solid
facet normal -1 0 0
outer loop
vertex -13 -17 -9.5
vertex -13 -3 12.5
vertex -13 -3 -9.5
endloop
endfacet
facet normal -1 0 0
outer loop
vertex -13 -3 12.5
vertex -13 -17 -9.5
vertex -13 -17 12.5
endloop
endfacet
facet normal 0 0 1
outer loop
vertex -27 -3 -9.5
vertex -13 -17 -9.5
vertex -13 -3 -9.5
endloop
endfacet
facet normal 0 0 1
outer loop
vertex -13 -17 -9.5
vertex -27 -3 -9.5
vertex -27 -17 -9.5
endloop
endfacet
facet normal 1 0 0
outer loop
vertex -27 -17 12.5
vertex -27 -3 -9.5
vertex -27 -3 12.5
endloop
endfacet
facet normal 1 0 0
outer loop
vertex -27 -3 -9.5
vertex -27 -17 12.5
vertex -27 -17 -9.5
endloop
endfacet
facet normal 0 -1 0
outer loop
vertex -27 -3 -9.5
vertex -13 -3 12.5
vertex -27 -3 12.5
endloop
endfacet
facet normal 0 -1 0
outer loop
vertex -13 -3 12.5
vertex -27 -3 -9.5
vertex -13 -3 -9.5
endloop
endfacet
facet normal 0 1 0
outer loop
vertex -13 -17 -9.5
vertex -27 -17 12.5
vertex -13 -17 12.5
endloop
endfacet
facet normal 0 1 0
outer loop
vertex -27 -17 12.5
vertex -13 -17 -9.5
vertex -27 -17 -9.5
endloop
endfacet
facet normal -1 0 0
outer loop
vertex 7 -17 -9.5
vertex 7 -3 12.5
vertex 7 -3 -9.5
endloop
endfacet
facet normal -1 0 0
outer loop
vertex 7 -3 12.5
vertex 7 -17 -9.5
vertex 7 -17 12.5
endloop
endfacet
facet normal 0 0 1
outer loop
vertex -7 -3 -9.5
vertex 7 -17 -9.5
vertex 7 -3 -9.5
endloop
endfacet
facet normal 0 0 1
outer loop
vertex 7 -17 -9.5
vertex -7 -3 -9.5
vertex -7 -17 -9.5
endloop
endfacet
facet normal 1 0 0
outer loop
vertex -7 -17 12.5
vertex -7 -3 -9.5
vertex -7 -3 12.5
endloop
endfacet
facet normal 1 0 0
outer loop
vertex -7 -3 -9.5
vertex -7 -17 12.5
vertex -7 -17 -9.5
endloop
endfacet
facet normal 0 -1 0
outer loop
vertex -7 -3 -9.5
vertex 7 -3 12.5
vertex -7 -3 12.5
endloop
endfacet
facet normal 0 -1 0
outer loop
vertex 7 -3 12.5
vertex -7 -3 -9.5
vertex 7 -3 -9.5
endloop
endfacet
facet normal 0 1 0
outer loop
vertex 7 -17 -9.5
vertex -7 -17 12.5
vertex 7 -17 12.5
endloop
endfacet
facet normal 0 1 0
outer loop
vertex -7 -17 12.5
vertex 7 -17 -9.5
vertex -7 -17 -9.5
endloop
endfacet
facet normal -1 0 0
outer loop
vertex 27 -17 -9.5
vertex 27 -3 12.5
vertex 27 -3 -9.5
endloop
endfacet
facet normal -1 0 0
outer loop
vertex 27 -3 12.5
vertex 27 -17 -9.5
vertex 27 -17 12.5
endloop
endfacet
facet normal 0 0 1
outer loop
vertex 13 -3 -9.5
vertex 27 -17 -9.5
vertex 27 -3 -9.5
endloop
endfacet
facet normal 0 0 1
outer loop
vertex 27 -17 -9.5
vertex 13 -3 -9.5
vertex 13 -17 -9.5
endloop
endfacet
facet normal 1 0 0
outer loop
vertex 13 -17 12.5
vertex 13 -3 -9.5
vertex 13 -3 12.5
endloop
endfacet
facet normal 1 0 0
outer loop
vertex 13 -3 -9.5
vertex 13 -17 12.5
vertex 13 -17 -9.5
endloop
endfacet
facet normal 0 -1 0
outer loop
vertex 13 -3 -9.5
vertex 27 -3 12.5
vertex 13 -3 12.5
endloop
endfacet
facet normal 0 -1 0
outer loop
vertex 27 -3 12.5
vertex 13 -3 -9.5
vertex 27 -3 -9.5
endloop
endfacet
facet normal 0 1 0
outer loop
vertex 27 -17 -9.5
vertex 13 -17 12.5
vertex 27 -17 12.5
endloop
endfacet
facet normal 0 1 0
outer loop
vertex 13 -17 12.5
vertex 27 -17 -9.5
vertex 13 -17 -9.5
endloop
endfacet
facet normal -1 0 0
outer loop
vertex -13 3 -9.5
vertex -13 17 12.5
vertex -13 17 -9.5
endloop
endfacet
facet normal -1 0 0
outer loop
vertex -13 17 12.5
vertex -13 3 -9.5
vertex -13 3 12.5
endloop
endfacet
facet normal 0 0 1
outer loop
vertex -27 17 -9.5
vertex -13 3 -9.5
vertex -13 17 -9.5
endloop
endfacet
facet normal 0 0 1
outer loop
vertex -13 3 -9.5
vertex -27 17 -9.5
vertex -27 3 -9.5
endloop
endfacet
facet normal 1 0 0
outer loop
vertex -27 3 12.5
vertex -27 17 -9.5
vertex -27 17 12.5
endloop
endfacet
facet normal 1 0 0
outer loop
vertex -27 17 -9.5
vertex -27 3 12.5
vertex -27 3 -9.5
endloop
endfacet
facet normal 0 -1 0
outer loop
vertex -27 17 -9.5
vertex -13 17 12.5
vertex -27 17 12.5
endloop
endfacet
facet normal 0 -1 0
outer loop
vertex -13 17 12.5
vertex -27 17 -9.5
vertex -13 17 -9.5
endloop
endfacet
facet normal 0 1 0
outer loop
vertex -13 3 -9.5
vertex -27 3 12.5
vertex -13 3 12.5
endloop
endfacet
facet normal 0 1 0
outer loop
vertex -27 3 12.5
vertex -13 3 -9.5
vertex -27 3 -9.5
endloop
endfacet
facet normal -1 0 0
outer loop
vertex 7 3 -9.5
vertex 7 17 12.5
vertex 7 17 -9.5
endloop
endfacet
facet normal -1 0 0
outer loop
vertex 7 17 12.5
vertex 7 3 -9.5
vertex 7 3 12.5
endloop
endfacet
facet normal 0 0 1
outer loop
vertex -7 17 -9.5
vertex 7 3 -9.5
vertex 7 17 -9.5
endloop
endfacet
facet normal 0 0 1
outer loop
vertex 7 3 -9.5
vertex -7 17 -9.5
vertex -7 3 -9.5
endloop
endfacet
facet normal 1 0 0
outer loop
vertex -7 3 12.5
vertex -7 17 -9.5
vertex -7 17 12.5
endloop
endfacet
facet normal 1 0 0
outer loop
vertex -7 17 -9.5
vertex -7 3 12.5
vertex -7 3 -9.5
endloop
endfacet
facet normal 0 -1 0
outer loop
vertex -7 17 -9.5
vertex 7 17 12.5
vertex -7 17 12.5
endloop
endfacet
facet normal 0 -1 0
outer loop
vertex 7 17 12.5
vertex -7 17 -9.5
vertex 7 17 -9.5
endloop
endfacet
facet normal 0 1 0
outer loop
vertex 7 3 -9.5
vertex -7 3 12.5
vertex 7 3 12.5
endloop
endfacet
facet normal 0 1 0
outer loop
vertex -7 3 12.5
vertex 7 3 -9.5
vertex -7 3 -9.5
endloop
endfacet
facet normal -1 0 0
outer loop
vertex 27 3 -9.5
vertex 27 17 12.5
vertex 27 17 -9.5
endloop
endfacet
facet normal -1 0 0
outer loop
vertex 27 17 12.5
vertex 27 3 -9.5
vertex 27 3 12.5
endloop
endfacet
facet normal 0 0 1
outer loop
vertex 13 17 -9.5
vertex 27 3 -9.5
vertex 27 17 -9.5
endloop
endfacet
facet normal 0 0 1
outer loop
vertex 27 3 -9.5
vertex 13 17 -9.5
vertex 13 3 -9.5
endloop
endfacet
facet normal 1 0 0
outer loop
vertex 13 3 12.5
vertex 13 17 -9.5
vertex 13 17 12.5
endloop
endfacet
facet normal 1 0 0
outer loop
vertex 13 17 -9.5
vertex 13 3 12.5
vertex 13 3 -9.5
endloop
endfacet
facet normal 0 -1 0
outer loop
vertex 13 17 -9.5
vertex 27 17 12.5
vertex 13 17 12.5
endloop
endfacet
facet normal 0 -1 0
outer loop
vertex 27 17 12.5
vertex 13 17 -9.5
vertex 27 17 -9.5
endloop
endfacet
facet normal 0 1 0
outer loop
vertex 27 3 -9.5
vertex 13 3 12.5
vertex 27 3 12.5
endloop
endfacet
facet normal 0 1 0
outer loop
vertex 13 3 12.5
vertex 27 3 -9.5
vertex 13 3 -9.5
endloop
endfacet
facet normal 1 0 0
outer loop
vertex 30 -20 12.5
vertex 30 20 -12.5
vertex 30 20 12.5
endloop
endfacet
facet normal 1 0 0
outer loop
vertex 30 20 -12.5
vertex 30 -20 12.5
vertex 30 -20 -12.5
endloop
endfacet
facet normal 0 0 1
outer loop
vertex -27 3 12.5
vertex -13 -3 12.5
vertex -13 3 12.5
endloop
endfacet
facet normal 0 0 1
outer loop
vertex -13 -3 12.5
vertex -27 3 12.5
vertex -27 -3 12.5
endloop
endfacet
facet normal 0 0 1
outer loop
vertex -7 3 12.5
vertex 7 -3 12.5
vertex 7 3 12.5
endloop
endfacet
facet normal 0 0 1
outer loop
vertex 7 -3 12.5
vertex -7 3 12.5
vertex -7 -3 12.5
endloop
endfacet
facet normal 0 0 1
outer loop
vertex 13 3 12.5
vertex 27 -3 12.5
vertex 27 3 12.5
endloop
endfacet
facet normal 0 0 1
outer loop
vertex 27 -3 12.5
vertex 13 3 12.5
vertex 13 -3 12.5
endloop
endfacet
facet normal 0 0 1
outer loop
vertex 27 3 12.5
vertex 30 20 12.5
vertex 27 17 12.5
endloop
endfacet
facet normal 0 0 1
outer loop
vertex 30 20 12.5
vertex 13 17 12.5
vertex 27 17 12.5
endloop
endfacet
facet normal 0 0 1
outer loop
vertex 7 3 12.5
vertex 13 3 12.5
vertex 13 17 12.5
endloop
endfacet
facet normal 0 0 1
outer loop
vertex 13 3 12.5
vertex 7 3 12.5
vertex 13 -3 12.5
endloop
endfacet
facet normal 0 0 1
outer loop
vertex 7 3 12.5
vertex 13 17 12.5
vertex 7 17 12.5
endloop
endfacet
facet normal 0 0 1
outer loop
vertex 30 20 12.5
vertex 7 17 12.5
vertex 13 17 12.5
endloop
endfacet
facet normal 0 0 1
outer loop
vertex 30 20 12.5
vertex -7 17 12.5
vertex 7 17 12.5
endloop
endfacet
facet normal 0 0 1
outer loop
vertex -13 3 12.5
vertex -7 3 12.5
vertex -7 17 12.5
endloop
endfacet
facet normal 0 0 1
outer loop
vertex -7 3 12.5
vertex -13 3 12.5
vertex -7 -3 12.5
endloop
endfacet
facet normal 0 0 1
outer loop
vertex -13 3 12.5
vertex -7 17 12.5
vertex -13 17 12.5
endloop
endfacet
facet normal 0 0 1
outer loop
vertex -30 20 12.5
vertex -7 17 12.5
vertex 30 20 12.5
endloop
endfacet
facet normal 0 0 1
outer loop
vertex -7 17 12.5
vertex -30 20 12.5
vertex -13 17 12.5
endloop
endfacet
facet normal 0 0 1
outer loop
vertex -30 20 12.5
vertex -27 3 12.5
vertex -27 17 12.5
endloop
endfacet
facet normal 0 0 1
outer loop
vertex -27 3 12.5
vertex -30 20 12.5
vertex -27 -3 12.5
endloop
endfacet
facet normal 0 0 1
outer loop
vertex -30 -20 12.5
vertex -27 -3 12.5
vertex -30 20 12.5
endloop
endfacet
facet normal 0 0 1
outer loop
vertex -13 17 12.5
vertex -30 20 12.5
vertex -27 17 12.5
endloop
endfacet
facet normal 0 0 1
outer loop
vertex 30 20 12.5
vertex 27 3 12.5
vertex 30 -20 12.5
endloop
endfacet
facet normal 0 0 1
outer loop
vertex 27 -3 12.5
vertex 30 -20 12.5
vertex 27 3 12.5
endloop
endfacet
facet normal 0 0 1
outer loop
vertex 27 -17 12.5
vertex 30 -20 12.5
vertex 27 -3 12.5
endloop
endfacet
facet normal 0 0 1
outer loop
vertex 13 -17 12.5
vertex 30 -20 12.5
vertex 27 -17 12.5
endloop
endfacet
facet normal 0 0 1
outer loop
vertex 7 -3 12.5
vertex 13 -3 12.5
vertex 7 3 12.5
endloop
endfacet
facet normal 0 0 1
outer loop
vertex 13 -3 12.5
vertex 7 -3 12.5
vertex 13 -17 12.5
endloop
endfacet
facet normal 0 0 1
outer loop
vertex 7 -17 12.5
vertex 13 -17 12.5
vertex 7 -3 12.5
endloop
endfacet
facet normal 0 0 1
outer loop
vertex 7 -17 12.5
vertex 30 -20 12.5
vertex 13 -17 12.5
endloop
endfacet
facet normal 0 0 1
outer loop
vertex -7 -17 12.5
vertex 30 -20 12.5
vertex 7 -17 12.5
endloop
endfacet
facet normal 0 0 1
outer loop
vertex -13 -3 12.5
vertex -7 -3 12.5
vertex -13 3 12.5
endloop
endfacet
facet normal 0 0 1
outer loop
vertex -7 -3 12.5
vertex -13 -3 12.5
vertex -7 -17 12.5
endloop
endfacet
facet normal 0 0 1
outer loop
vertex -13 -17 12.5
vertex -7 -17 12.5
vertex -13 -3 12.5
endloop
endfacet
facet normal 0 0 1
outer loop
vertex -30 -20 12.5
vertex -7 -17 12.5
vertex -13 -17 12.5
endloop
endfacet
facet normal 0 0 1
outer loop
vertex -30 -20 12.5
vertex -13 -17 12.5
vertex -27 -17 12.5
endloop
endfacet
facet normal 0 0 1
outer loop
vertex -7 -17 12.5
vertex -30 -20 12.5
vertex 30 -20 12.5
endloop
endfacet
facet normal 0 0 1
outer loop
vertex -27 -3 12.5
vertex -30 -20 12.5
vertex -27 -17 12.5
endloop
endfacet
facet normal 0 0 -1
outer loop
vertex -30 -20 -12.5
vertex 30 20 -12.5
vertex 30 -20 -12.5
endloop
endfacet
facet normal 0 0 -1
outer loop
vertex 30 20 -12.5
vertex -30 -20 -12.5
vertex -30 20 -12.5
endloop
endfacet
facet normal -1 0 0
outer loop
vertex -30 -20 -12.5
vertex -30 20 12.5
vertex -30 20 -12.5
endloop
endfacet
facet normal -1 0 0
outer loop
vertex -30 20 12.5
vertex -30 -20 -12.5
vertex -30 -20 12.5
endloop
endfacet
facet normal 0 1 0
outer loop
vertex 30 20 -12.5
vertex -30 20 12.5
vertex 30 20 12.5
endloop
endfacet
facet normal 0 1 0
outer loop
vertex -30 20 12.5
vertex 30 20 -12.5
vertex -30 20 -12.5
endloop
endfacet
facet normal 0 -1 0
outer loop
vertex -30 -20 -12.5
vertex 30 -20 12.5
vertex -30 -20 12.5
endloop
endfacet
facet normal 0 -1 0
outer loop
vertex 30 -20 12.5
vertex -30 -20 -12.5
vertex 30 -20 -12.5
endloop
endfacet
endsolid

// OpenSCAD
$fn = 32;

// ----------------------------------------------------------------------
// Pocket plate 60 x 40 x 25
// 2 x 3 pockets 14 mm square, 22 mm deep
// ----------------------------------------------------------------------

// --- parameters (mm) ---
thickness = 25;  // plate thickness
floor_t = 3;     // material left under each pocket
pocket = 14;     // pocket side length
pitch_x = 20;    // pocket pitch along X
pitch_y = 20;    // pocket pitch along Y
cols = 3;        // pockets per row
rows = 2;        // rows of pockets

// --- derived feature positions (mm) ---
depth = thickness - floor_t;        // = 22   pocket depth, down to the floor
span_x = (cols - 1) * pitch_x;      // = 40   distance between outer pockets
span_y = (rows - 1) * pitch_y;      // = 20   distance between outer pocket rows
origin_x = -span_x / 2;             // = -20   X of the first pocket
origin_y = -span_y / 2;             // = -10   Y of the first pocket
plate = [span_x + pocket + 6, span_y + pocket + 6, thickness];  // = [60, 40, 25]   overall size: pockets plus 3 mm of wall on each side
feature_centers = [
  [origin_x + 0 * pitch_x, origin_y + 0 * pitch_y],
  [origin_x + 1 * pitch_x, origin_y + 0 * pitch_y],
  [origin_x + 2 * pitch_x, origin_y + 0 * pitch_y],
  [origin_x + 0 * pitch_x, origin_y + 1 * pitch_y],
  [origin_x + 1 * pitch_x, origin_y + 1 * pitch_y],
  [origin_x + 2 * pitch_x, origin_y + 1 * pitch_y]
];   // pocket centres, used verbatim by the cutter loop

// plate outline, then one pocket per centre in feature_centers
difference() {
  cube(plate, center = true);
  for (centre = feature_centers)
    translate([centre[0] - pocket / 2, centre[1] - pocket / 2, plate[2] / 2 - depth])
      cube([pocket, pocket, depth + 1]);  // centred on the declared pocket centre
}
